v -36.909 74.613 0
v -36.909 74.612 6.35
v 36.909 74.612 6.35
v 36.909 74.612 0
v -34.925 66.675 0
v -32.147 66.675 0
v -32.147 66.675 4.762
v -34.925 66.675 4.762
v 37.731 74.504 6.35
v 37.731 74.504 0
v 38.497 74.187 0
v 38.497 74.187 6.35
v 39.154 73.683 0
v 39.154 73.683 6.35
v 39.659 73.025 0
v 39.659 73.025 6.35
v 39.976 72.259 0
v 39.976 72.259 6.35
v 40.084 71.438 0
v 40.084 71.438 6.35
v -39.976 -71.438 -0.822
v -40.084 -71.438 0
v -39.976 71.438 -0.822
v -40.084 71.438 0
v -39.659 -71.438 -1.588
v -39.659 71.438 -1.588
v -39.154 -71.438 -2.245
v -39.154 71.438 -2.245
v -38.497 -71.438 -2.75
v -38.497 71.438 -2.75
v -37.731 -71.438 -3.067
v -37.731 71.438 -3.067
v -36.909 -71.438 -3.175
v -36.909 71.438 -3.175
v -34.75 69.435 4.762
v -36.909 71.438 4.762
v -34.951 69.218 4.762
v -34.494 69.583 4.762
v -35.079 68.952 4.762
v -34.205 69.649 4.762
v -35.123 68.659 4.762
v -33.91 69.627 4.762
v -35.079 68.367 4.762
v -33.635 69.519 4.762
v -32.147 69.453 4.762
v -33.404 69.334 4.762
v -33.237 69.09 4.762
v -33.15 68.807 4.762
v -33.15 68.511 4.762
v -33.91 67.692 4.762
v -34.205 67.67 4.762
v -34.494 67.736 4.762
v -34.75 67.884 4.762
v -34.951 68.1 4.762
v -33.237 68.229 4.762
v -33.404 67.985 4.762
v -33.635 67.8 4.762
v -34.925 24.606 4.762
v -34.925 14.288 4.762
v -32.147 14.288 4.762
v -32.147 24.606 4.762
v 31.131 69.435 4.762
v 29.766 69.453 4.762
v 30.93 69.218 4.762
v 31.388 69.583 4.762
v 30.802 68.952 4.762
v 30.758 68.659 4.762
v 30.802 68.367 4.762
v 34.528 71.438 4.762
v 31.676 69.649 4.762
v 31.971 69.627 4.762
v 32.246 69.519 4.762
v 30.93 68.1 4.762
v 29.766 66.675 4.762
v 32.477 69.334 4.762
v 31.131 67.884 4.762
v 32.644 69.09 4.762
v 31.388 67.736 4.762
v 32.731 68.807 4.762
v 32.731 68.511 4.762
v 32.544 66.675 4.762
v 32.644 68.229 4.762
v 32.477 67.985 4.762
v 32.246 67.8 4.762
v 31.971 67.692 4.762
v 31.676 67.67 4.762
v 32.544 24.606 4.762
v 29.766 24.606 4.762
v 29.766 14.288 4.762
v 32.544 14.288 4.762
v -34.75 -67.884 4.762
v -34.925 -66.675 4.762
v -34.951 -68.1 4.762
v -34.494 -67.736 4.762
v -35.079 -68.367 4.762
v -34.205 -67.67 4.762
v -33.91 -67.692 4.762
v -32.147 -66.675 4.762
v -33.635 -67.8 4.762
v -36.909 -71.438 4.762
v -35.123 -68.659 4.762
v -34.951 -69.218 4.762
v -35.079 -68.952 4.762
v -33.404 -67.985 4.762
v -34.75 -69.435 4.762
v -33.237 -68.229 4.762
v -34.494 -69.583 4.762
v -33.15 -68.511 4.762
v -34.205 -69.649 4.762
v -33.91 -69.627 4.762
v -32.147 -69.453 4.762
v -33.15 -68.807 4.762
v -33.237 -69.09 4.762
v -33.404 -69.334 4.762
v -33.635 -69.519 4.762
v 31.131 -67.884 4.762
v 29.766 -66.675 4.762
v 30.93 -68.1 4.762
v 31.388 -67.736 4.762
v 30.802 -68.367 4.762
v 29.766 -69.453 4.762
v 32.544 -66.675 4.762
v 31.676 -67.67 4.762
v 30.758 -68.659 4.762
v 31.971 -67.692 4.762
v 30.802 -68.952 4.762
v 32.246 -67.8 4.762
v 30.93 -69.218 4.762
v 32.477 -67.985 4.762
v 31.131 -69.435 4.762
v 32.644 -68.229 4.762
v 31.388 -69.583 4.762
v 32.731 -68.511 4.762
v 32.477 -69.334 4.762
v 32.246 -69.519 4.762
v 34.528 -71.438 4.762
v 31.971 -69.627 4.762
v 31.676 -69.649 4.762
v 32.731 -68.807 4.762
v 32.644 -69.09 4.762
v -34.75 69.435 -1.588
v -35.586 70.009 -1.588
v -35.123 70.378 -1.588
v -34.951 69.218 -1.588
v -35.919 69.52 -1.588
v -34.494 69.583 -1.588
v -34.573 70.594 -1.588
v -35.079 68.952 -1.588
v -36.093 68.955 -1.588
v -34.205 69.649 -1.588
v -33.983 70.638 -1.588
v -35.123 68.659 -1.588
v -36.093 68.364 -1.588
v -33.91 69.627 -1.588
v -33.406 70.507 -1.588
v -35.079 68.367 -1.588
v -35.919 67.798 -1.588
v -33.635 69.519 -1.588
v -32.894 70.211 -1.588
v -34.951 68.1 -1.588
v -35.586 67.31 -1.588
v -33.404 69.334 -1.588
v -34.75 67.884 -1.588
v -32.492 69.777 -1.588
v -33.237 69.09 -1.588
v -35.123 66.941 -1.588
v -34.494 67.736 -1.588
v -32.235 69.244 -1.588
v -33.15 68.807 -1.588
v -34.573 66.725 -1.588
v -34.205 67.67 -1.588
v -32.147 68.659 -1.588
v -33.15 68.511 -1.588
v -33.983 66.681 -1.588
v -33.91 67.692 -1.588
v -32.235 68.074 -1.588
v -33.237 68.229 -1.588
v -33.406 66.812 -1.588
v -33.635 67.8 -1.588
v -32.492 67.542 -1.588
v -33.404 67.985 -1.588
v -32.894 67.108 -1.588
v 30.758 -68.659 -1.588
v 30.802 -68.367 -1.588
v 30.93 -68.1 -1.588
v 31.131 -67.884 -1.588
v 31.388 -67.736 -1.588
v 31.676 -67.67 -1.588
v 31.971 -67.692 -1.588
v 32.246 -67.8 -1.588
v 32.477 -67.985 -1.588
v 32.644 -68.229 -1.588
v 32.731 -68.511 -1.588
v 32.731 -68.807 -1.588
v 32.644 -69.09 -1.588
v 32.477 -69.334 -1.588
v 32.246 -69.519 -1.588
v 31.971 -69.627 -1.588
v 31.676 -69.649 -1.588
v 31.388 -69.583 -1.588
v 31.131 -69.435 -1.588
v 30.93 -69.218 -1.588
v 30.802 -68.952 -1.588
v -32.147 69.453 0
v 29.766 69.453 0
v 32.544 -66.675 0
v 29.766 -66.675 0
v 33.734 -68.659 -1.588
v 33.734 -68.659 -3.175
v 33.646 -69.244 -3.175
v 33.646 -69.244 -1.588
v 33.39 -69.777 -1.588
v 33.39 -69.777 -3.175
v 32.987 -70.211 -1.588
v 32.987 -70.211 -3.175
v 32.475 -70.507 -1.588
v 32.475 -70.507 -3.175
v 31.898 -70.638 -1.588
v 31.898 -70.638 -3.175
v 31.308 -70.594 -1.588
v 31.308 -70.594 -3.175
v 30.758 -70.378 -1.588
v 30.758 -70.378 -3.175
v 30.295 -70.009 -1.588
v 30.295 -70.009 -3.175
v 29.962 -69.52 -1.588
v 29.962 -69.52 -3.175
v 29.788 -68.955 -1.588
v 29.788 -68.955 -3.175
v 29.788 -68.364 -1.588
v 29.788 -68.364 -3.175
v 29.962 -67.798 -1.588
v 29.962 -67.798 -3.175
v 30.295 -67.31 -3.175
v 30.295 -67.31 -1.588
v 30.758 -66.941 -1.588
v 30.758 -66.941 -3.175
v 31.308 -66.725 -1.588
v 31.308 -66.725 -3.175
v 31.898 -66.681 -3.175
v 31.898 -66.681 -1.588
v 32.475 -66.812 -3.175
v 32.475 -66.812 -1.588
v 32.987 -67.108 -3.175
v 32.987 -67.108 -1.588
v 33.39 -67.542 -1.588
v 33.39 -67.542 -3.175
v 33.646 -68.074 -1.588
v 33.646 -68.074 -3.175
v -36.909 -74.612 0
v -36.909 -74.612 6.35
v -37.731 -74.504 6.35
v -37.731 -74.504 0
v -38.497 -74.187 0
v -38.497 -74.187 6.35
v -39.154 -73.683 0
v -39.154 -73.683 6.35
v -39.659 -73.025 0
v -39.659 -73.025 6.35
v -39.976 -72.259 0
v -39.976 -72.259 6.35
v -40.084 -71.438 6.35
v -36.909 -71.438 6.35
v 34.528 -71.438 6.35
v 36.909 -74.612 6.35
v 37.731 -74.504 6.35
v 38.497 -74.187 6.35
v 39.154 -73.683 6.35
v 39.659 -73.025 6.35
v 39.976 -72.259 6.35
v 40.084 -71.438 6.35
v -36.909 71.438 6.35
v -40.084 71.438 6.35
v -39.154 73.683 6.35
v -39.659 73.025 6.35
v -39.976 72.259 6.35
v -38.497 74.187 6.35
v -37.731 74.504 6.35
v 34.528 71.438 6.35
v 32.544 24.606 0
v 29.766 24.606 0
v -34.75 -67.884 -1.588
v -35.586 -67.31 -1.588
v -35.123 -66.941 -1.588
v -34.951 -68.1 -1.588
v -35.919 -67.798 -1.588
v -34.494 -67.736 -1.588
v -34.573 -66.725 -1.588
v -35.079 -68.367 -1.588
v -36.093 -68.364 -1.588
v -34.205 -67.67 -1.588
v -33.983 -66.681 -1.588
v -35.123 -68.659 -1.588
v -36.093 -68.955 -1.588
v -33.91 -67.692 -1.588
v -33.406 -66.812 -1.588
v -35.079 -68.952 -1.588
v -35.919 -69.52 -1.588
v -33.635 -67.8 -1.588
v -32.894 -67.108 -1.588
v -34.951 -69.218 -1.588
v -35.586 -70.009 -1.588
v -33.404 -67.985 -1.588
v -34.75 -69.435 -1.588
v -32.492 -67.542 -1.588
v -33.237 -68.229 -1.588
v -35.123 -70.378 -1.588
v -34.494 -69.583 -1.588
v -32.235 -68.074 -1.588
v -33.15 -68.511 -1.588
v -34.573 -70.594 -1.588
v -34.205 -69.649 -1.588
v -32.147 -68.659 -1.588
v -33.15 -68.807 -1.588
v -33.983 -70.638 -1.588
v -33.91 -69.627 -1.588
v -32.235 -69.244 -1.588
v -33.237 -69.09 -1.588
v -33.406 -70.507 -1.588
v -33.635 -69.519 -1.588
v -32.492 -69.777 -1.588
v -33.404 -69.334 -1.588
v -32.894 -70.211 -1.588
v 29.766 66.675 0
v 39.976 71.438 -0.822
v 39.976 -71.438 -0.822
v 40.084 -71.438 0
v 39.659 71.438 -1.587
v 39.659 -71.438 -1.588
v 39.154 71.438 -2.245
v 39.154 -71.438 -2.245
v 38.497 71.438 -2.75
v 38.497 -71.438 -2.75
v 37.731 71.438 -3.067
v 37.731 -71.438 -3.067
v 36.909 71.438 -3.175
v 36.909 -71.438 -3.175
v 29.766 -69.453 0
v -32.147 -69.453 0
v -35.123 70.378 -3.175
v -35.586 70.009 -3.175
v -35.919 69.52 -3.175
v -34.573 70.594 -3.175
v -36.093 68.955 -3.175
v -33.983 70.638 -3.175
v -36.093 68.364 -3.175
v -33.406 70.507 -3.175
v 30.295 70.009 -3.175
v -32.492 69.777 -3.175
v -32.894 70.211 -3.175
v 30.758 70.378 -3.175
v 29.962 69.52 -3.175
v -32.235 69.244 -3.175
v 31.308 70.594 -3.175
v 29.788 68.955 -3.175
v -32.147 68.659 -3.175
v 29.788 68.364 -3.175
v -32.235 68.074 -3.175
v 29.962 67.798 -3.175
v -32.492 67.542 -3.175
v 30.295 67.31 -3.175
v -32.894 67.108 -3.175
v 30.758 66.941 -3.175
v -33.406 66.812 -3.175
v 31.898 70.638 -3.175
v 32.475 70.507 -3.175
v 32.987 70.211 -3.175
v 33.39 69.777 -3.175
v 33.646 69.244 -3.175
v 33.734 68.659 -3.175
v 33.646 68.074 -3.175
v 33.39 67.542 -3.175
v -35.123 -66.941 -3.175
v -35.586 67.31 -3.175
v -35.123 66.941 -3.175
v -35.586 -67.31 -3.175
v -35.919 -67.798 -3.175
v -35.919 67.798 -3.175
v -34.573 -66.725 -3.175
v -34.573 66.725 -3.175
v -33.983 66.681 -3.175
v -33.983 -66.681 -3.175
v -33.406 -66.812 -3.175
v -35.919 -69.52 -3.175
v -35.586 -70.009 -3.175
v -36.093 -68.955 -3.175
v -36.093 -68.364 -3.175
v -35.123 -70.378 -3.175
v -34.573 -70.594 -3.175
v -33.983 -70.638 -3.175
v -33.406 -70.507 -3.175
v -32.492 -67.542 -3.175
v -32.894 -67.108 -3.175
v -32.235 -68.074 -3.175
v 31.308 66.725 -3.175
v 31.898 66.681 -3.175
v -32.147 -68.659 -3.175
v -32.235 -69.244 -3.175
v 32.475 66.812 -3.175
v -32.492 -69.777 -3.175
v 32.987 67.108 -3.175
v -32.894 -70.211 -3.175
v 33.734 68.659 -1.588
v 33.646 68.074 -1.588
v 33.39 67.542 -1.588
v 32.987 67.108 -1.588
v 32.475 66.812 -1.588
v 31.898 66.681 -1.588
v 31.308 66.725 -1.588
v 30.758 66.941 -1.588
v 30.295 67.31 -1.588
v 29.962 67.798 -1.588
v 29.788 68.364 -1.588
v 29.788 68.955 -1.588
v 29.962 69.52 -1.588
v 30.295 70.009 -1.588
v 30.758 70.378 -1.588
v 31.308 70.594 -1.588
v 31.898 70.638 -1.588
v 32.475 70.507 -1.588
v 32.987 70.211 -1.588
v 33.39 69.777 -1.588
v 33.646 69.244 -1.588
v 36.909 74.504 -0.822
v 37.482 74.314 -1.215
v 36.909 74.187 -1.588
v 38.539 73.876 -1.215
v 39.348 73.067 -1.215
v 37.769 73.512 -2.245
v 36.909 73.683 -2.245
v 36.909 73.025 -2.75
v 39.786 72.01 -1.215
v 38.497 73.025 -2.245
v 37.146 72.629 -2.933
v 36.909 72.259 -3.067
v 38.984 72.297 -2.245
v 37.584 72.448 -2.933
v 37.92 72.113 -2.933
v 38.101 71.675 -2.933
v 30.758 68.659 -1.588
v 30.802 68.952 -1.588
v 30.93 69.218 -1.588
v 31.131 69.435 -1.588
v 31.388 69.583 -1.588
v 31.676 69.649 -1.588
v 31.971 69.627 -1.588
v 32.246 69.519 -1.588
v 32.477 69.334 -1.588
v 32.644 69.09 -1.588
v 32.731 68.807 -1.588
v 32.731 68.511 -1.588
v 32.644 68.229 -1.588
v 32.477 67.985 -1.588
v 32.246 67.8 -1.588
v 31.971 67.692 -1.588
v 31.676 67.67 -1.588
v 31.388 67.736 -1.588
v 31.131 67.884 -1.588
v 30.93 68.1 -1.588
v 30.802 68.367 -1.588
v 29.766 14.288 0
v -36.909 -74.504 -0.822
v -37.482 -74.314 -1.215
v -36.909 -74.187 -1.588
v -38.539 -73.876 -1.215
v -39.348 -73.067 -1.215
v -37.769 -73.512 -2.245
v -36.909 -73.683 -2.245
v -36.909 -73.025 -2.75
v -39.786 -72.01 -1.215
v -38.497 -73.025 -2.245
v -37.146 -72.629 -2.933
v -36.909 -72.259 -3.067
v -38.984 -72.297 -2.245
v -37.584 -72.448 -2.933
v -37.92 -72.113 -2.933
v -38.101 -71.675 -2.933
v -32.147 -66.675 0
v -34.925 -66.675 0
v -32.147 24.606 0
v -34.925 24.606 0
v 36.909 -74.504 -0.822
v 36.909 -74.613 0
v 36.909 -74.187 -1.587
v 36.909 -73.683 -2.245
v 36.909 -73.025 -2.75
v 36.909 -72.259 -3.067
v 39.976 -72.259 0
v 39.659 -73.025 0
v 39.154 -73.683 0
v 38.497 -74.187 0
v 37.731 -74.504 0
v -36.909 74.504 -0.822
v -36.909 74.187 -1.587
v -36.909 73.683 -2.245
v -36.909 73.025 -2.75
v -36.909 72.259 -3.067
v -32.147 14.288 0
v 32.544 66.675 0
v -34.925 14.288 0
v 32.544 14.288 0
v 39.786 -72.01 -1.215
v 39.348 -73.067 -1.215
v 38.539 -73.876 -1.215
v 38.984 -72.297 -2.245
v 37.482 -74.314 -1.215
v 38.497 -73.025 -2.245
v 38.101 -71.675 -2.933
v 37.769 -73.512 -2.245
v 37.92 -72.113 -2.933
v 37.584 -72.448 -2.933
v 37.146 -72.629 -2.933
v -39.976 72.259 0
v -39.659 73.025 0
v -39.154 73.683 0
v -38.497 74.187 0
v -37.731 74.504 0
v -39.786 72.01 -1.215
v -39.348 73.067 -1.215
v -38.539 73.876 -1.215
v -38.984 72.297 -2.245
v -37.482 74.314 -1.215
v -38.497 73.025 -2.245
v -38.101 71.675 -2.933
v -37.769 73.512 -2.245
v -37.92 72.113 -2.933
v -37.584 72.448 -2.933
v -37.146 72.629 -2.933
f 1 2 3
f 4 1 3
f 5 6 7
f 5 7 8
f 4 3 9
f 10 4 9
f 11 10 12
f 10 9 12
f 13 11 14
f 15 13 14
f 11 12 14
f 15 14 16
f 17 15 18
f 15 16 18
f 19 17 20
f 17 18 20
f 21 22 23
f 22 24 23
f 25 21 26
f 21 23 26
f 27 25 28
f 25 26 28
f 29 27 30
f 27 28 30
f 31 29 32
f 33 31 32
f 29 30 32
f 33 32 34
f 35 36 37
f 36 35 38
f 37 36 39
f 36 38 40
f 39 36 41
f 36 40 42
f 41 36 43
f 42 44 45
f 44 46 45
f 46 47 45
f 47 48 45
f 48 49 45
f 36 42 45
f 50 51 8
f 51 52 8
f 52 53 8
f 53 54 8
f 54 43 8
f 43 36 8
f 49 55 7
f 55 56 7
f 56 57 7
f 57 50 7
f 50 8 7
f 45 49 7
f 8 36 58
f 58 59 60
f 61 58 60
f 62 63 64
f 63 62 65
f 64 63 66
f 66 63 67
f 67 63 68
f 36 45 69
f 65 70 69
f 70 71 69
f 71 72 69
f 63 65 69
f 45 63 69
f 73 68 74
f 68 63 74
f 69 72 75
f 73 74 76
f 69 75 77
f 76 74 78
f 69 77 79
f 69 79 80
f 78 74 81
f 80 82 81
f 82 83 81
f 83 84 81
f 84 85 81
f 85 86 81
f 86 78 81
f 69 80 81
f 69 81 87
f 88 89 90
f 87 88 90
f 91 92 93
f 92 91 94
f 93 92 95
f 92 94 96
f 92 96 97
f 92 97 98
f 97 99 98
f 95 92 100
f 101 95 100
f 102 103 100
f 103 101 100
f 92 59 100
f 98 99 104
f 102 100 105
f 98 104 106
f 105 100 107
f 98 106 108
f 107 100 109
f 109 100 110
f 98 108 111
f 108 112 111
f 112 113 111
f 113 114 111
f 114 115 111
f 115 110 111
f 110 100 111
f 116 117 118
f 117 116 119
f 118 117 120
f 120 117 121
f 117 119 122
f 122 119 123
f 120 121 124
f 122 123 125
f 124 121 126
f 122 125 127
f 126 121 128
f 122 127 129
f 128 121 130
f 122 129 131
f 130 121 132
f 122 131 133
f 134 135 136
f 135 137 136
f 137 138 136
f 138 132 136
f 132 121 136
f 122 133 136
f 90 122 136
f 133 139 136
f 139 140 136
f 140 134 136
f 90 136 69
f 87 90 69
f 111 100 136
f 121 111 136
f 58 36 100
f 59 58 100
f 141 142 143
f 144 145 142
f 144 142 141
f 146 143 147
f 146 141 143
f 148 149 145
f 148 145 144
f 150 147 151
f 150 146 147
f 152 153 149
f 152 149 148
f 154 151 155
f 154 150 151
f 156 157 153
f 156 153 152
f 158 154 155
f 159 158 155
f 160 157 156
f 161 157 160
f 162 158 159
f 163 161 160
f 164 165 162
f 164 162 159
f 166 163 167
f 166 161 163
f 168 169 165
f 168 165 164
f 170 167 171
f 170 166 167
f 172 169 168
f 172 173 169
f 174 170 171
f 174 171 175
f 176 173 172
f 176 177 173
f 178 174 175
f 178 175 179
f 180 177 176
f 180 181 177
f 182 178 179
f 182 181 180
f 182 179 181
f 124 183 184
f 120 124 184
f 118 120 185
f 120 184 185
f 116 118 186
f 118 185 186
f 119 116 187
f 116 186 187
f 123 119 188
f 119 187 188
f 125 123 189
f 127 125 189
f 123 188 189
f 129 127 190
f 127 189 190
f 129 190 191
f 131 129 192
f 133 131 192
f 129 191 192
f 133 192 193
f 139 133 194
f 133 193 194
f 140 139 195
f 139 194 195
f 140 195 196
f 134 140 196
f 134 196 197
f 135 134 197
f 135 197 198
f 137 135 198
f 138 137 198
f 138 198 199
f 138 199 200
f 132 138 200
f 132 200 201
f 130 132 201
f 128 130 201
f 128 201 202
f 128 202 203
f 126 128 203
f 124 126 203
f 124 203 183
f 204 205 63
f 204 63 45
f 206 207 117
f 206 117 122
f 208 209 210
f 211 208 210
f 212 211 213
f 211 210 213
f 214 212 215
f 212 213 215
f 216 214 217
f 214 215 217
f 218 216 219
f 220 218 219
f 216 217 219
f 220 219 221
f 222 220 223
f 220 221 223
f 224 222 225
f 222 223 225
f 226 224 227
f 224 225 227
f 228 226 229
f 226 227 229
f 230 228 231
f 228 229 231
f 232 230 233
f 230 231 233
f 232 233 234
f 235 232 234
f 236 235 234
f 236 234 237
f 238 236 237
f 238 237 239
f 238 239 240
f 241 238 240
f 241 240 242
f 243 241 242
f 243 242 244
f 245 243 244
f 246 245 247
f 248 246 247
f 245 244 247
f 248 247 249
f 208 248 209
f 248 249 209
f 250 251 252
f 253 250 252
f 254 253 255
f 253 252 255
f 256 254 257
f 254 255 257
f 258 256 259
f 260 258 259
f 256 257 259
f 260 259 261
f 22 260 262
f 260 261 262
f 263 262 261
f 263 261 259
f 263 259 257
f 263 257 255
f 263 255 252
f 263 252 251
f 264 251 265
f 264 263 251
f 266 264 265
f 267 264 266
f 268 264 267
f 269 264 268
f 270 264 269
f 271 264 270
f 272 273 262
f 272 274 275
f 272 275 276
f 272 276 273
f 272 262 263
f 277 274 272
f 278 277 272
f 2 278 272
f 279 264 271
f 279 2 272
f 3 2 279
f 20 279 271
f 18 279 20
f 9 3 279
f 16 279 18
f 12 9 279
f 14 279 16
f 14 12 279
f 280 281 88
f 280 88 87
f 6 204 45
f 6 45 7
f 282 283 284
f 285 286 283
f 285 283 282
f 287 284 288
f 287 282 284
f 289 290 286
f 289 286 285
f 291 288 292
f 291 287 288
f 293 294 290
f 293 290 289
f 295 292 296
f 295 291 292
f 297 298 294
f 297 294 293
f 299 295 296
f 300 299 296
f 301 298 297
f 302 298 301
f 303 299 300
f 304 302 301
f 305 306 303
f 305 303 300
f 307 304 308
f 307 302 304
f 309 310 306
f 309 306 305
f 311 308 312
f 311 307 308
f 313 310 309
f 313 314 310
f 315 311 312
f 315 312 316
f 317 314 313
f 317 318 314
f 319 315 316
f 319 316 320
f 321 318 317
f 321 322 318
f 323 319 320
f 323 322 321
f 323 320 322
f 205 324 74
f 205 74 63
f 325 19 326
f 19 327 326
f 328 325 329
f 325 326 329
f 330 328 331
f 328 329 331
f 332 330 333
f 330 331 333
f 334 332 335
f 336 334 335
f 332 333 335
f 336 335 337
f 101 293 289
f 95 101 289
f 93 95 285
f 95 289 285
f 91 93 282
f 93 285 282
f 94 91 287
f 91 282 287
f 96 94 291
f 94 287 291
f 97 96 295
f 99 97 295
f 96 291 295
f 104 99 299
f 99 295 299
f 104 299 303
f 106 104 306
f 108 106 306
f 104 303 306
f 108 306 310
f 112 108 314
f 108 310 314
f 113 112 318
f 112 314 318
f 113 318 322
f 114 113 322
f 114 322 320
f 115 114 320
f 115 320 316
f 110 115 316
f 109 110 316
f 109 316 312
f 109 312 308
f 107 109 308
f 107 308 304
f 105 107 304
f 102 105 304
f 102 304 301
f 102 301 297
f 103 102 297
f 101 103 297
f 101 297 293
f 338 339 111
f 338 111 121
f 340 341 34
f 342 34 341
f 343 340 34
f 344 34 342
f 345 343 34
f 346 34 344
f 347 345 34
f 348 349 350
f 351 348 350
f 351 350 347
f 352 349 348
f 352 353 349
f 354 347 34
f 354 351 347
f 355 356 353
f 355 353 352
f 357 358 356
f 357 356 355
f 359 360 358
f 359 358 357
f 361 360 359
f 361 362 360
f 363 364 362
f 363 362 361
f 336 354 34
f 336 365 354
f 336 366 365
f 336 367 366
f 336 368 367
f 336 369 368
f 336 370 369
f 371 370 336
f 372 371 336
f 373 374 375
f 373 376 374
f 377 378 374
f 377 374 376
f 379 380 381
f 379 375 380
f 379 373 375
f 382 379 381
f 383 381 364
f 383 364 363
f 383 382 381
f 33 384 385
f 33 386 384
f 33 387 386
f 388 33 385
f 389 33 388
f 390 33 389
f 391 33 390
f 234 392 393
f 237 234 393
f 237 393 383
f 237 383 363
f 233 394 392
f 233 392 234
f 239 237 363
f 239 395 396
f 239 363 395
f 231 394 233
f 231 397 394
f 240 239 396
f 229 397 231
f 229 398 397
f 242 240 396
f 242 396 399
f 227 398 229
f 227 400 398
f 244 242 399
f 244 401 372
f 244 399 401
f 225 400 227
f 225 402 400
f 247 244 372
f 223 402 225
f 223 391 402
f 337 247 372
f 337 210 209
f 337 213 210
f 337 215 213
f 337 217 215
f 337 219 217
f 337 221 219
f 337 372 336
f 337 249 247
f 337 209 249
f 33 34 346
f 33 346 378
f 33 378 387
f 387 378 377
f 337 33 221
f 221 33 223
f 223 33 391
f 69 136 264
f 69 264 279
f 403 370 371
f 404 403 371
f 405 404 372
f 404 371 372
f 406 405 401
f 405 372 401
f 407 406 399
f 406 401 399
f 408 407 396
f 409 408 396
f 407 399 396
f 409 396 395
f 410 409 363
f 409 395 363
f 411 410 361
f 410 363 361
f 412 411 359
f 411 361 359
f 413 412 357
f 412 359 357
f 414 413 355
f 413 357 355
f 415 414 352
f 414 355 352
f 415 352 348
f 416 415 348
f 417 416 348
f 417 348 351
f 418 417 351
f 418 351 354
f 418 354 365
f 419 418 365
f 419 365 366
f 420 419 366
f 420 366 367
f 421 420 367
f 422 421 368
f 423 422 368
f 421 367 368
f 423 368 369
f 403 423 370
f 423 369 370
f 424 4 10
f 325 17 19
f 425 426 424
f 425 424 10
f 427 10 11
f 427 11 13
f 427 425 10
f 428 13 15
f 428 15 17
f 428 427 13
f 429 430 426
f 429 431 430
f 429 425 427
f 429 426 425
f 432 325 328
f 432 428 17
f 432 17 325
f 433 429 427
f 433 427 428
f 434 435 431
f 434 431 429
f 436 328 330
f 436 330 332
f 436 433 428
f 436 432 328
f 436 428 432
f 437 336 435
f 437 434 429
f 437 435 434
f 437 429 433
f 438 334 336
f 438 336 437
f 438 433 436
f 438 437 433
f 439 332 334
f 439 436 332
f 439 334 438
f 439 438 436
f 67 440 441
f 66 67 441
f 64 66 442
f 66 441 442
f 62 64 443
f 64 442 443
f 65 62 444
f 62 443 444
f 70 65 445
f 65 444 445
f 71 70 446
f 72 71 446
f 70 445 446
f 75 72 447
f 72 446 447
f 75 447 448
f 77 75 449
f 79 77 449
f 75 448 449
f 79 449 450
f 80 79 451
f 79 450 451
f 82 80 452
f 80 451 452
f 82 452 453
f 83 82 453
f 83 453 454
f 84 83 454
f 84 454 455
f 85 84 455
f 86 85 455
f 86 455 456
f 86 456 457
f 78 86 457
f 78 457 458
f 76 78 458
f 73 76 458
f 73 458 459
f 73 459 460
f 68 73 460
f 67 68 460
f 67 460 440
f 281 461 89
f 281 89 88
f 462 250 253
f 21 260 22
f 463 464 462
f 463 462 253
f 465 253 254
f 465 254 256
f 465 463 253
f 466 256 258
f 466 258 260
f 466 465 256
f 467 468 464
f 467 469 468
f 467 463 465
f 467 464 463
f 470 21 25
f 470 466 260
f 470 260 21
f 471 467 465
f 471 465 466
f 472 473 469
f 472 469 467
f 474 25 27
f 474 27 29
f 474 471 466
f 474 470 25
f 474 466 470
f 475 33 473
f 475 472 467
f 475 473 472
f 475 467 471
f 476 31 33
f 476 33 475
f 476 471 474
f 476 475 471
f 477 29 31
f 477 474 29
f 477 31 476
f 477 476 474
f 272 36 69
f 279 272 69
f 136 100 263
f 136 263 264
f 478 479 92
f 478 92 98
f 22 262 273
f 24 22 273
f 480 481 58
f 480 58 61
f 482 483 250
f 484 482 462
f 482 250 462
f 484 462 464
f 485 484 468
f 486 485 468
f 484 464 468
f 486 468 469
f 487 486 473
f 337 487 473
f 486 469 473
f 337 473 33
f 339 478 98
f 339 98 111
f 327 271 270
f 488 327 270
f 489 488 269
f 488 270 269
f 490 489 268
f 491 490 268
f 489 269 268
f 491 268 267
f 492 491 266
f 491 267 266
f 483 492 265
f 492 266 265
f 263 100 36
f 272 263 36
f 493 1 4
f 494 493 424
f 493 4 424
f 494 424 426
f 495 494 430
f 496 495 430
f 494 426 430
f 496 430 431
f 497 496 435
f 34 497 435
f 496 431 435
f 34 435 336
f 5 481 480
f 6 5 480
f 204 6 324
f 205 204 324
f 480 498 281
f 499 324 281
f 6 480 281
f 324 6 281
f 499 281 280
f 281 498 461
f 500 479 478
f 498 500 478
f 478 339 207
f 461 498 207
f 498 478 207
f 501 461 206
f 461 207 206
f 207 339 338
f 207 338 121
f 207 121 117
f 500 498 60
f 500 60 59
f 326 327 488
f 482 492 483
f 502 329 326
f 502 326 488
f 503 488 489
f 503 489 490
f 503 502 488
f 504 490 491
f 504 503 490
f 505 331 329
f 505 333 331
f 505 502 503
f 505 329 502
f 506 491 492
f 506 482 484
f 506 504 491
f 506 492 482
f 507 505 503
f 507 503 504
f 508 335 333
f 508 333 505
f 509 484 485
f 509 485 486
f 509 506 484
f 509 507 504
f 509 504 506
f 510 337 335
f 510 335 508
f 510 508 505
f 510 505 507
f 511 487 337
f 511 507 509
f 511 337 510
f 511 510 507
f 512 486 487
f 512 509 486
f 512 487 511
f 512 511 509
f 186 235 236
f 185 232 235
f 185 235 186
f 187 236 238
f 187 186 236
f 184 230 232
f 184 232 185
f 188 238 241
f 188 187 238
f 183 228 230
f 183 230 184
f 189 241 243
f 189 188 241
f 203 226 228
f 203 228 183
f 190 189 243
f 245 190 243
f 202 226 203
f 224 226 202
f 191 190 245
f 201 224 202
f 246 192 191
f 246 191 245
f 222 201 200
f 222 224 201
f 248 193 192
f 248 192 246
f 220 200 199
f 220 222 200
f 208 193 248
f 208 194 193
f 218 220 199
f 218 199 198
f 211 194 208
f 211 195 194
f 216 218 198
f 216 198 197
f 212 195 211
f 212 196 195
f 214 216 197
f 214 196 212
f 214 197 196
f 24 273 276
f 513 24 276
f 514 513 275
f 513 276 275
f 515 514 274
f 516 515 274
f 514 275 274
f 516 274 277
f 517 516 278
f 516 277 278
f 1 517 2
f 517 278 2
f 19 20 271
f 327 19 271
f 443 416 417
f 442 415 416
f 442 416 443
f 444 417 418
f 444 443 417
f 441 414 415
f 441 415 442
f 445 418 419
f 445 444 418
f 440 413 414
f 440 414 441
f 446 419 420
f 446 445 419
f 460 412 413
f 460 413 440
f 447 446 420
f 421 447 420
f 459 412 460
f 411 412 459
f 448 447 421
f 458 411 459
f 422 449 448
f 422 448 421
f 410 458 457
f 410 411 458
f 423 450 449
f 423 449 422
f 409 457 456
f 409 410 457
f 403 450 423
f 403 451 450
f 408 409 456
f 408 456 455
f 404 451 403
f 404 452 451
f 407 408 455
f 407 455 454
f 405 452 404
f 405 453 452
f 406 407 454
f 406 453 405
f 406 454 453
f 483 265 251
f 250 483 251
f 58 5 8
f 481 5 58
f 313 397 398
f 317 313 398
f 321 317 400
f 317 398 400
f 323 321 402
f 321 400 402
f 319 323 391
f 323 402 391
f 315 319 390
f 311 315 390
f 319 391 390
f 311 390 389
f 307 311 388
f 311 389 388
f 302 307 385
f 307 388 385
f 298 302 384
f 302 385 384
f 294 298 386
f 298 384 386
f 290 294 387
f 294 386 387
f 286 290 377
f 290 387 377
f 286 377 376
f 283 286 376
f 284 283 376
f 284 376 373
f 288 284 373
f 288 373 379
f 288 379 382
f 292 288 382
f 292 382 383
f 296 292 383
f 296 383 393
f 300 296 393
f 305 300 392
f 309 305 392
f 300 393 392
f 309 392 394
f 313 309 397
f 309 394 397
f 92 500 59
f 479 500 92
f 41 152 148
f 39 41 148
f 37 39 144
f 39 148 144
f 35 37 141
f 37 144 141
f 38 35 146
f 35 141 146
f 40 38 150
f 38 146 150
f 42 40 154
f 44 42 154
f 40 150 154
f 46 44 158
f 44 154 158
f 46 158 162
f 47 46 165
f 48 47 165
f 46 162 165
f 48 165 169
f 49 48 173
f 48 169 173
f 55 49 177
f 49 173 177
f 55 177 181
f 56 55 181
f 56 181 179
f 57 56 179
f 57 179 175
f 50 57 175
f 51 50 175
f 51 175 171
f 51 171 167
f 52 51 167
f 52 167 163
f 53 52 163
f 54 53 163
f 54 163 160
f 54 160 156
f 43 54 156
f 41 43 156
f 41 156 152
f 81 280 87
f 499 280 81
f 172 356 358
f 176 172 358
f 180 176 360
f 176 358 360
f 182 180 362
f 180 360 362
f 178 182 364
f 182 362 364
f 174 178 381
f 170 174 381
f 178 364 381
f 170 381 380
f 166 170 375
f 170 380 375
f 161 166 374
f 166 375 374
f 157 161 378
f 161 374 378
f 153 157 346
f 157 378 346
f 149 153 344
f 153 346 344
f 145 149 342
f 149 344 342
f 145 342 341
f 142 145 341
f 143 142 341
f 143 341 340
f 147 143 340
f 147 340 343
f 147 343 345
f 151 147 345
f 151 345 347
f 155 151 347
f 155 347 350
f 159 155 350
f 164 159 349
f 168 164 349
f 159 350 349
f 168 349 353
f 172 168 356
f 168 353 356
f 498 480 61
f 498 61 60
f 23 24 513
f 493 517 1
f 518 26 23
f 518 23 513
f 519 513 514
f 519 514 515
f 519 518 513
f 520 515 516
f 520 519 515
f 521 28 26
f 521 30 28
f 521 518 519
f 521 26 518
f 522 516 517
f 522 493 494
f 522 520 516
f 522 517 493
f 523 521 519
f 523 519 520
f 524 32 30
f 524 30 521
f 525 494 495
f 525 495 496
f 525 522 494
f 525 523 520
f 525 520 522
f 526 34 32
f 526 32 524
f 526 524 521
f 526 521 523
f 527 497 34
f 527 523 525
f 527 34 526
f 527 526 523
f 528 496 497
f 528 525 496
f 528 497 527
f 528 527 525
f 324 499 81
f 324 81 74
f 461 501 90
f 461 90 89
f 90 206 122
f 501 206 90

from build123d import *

# Parameters (mm, degrees)
F0_W      = 71.4375
F0_H      = 142.875
F1_DEPTH  = 6.35
F3_DEPTH  = 4.7625
F5_DEPTH  = 3.175
F6_R      = 3.175
F8_D      = 1.984375
F9_R      = 1.984375
F9_R_2    = 0.9921875
F10_DEPTH = 1.5875


with BuildPart() as f1:
    # F0 (on Top) → F1 (new body)
    with BuildSketch(Plane.XY):
        with BuildLine():
            Line((-40.084375, 71.4375), (-40.084375, 0))
            Line((-40.084375, 0), (-40.084375, -71.4375))
            ThreePointArc((-40.084375, -71.4375), (-39.1544390303, -73.6825640303), (-36.909375, -74.6125))
            Line((-36.909375, -74.6125), (36.909375, -74.6125))
            ThreePointArc((36.909375, -74.6125), (39.1544390303, -73.6825640303), (40.084375, -71.4375))
            Line((40.084375, -71.4375), (40.084375, 71.4375))
            ThreePointArc((40.084375, 71.4375), (39.1544390303, 73.6825640303), (36.909375, 74.6125))
            Line((36.909375, 74.6125), (-36.909375, 74.6125))
            ThreePointArc((-36.909375, 74.6125), (-39.1544390303, 73.6825640303), (-40.084375, 71.4375))
        make_face()
        with Locations((-1.190625, 0)):
            Rectangle(F0_W, F0_H, mode=Mode.SUBTRACT)
    extrude(amount=F1_DEPTH)

    # F2 (on face) → F3 (join)
    with BuildSketch(Plane(origin=(0, 0, 0), x_dir=(1, 0, 0), z_dir=(0, 0, -1))):
        with BuildLine():
            Line((-40.084375, 71.4375), (-40.084375, -71.4375))
            ThreePointArc((-40.084375, -71.4375), (-39.1544390303, -73.6825640303), (-36.909375, -74.6125))
            Line((-36.909375, -74.6125), (36.909375, -74.6125))
            ThreePointArc((36.909375, -74.6125), (39.1544390303, -73.6825640303), (40.084375, -71.4375))
            Line((40.084375, -71.4375), (40.084375, 71.4375))
            ThreePointArc((40.084375, 71.4375), (39.1544390303, 73.6825640303), (36.909375, 74.6125))
            Line((36.909375, 74.6125), (-36.909375, 74.6125))
            ThreePointArc((-36.909375, 74.6125), (-39.1544390303, 73.6825640303), (-40.084375, 71.4375))
        make_face()
        Polygon((-36.909375, -19.84375), (-36.909375, 71.4375), (34.528125, 71.4375), (34.528125, -19.84375), (34.528125, -71.4375), (-36.909375, -71.4375), align=None, mode=Mode.SUBTRACT)
        Polygon((34.528125, 71.4375), (-36.909375, 71.4375), (-36.909375, -19.84375), (-32.146875, -19.84375), (-32.146875, -14.2875), (-34.925, -14.2875), (-34.925, 15.08125), (-34.925, 24.60625), (-34.925, 66.675), (-32.146875, 66.675), (-32.146875, 69.453125), (29.765625, 69.453125), (29.765625, 66.675), (32.54375, 66.675), (32.54375, 24.60625), (32.54375, 15.08125), (32.54375, -14.2875), (29.765625, -14.2875), (29.765625, -19.84375), (34.528125, -19.84375), align=None)
        Polygon((-32.146875, -19.84375), (-36.909375, -19.84375), (-36.909375, -71.4375), (34.528125, -71.4375), (34.528125, -19.84375), (29.765625, -19.84375), (29.765625, -24.60625), (32.54375, -24.60625), (32.54375, -66.675), (29.765625, -66.675), (29.765625, -69.453125), (-32.146875, -69.453125), (-32.146875, -66.675), (-34.925, -66.675), (-34.925, -24.60625), (-32.146875, -24.60625), align=None)
    extrude(amount=-F3_DEPTH)

    # F4 (on face) → F5 (join)
    with BuildSketch(Plane(origin=(0, 0, 0), x_dir=(1, 0, 0), z_dir=(0, 0, -1))):
        with BuildLine():
            ThreePointArc((-36.909375, 74.6125), (-39.1544390303, 73.6825640303), (-40.084375, 71.4375))
            Line((-40.084375, 71.4375), (-40.084375, -71.4375))
            ThreePointArc((-40.084375, -71.4375), (-39.1544390303, -73.6825640303), (-36.909375, -74.6125))
            Line((-36.909375, -74.6125), (36.909375, -74.6125))
            ThreePointArc((36.909375, -74.6125), (39.1544390303, -73.6825640303), (40.084375, -71.4375))
            Line((40.084375, -71.4375), (40.084375, 71.4375))
            ThreePointArc((40.084375, 71.4375), (39.1544390303, 73.6825640303), (36.909375, 74.6125))
            Line((36.909375, 74.6125), (-36.909375, 74.6125))
        make_face()
        Polygon((29.765625, 66.675), (32.54375, 66.675), (32.54375, -14.2875), (29.765625, -14.2875), (29.765625, -24.60625), (32.54375, -24.60625), (32.54375, -66.675), (29.765625, -66.675), (29.765625, -69.453125), (-32.146875, -69.453125), (-32.146875, -66.675), (-34.925, -66.675), (-34.925, -24.60625), (-32.146875, -24.60625), (-32.146875, -14.2875), (-34.925, -14.2875), (-34.925, 66.675), (-32.146875, 66.675), (-32.146875, 69.453125), (29.765625, 69.453125), align=None, mode=Mode.SUBTRACT)
        Polygon((32.54375, -14.2875), (32.54375, 66.675), (29.765625, 66.675), (29.765625, 69.453125), (-32.146875, 69.453125), (-32.146875, 66.675), (-34.925, 66.675), (-34.925, -14.2875), (-32.146875, -14.2875), (-32.146875, -24.60625), (-34.925, -24.60625), (-34.925, -66.675), (-32.146875, -66.675), (-32.146875, -69.453125), (29.765625, -69.453125), (29.765625, -66.675), (32.54375, -66.675), (32.54375, -24.60625), (29.765625, -24.60625), (29.765625, -14.2875), align=None)
    extrude(amount=F5_DEPTH)

    # F6
    f6_edges = [f1.edges().sort_by_distance(p)[0] for p in [
        (-40.084375, 0, -3.175),
    ]]
    fillet(f6_edges, radius=F6_R)

    # F8 (through all)
    with Locations(Plane.XY.offset(4.7625)):
        with Locations((-34.13125, -68.659375), (31.75, -68.659375), (31.75, 68.659375), (-34.13125, 68.659375)):
            Hole(F8_D / 2)

    # F9 (on face) → F10 (cut)
    with BuildSketch(Plane(origin=(0, 0, -3.175), x_dir=(1, 0, 0), z_dir=(0, 0, -1))):
        with Locations((-34.13125, 68.659375)):
            Circle(F9_R)
        with Locations((-34.13125, 68.659375)):
            Circle(F9_R_2, mode=Mode.SUBTRACT)
        with Locations((31.75, 68.659375)):
            Circle(F9_R)
        with Locations((31.75, 68.659375)):
            Circle(F9_R_2, mode=Mode.SUBTRACT)
        with Locations((-34.13125, -68.659375)):
            Circle(F9_R)
        with Locations((-34.13125, -68.659375)):
            Circle(F9_R_2, mode=Mode.SUBTRACT)
        with Locations((31.75, -68.659375)):
            Circle(F9_R)
        with Locations((31.75, -68.659375)):
            Circle(F9_R_2, mode=Mode.SUBTRACT)
    extrude(amount=-F10_DEPTH, mode=Mode.SUBTRACT)


solid = f1.part
